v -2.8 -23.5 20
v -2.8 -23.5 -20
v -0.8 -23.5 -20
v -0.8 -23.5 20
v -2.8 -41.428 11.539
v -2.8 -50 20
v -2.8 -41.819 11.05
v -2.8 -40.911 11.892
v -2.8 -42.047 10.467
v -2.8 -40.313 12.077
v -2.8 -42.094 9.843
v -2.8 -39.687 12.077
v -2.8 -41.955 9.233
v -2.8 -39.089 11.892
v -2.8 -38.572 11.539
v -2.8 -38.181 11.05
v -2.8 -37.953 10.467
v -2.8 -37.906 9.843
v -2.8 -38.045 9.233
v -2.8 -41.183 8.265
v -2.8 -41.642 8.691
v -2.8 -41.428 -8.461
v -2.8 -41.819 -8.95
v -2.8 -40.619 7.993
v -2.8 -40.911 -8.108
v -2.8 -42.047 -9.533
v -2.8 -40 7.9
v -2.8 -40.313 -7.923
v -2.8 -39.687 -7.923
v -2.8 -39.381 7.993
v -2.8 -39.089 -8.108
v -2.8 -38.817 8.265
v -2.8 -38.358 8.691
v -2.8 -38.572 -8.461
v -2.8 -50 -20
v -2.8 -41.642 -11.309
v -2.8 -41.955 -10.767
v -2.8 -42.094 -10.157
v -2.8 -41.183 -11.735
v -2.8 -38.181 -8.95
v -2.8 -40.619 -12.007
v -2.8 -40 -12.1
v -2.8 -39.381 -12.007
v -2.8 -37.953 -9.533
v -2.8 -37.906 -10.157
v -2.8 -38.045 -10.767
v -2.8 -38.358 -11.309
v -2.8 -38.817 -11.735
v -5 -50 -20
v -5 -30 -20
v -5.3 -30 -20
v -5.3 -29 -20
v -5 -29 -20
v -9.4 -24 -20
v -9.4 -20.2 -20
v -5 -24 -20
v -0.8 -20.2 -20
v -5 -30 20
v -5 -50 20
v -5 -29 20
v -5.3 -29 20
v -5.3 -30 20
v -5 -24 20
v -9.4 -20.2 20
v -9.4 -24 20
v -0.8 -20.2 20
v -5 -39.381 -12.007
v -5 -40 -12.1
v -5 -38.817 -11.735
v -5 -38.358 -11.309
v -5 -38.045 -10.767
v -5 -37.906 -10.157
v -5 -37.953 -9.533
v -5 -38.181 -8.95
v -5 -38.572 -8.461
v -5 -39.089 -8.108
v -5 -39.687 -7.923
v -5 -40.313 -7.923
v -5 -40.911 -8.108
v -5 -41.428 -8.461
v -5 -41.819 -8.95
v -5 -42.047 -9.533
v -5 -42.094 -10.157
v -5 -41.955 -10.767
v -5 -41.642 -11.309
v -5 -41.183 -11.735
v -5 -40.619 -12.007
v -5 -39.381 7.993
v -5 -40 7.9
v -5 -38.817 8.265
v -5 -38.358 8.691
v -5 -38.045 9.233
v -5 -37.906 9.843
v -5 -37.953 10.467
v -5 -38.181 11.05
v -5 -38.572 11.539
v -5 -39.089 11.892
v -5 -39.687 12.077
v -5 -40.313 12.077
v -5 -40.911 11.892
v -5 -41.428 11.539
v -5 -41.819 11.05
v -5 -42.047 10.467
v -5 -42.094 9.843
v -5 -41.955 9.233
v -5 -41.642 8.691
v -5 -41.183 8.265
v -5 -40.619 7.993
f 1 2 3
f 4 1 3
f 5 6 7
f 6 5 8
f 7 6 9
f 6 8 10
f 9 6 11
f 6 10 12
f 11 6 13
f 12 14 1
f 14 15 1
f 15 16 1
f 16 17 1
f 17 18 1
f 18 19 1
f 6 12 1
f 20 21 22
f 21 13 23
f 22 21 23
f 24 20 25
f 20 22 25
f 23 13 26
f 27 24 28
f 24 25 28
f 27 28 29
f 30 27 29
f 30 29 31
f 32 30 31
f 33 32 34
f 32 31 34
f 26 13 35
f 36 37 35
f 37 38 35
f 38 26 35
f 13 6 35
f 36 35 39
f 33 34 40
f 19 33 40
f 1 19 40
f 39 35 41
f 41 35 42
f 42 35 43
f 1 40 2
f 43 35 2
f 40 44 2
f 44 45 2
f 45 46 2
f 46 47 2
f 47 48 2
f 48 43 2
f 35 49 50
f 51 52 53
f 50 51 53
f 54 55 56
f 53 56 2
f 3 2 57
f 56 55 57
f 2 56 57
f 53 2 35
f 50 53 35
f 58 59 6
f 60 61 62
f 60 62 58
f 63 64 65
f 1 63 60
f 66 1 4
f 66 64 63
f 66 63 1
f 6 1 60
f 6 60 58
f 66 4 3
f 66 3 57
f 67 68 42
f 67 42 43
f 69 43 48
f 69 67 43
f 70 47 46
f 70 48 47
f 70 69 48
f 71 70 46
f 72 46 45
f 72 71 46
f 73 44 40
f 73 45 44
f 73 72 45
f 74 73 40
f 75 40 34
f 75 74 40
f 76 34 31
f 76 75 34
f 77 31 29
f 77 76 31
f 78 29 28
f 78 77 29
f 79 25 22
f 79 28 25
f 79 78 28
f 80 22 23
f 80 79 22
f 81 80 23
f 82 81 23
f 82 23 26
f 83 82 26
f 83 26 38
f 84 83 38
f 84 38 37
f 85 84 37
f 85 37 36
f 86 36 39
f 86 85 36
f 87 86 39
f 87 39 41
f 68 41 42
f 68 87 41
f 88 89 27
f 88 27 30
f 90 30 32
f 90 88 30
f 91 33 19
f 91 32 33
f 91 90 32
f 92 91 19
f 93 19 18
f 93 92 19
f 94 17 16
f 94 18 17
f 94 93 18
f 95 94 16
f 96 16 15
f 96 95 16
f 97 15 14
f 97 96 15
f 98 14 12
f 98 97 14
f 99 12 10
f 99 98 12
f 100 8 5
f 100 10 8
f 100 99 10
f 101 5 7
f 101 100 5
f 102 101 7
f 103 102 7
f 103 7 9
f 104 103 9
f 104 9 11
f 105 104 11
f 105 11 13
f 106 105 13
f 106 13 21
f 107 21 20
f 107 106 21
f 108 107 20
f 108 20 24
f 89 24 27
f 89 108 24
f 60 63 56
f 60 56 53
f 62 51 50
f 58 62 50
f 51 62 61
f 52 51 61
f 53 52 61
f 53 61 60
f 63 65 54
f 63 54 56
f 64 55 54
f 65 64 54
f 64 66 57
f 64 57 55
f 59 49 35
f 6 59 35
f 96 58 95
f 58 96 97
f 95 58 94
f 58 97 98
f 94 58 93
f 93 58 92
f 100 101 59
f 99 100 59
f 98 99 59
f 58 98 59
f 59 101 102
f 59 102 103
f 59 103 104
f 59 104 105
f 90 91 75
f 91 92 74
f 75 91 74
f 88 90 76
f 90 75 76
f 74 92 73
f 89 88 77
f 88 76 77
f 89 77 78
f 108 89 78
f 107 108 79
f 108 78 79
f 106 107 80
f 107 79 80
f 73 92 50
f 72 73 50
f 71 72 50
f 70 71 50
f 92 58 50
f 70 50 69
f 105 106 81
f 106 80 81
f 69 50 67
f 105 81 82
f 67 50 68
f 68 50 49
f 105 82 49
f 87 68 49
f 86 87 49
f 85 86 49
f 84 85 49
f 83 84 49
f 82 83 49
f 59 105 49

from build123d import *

# Parameters (mm, degrees)
CLIP_EXTRUDE_START           = -20
CLIP_EXTRUDE_DEPTH           = 40
ANTIOFFSETBUMP_EXTRUDE_START = -20
ANTIUPLIFTBUMP_SKETCH_W      = 0.3
ANTIUPLIFTBUMP_SKETCH_H      = 1
ANTIOFFSETBUMP_EXTRUDE_DEPTH = 40
MOUNTHOLES_CUT_DEPTH         = 55.665894029
MOUNTHOLES_CUT_DEPTH_BACK    = 55.665894029
MOUNTHOLES_SKETCH_R          = 2.1


with BuildPart() as part:
    # panelClipSection_sketch → clip_extrude (new body)
    with BuildSketch(Plane.XY.offset(CLIP_EXTRUDE_START)):
        Polygon((-9.40000037, -23.99999963), (-5.00000037, -23.99999963), (-5.00000037, -49.99999963), (-2.80000037, -49.99999963), (-2.80000037, -23.49999963), (-0.80000037, -23.49999963), (-0.80000037, -20.19999963), (-9.40000037, -20.19999963), align=None)
    extrude(amount=CLIP_EXTRUDE_DEPTH)

    # antiUpliftBump_sketch → antiOffsetBump_extrude (add)
    with BuildSketch(Plane.XY.offset(ANTIOFFSETBUMP_EXTRUDE_START)):
        with Locations((-5.15000037, -29.49999963)):
            Rectangle(ANTIUPLIFTBUMP_SKETCH_W, ANTIUPLIFTBUMP_SKETCH_H)
    extrude(amount=ANTIOFFSETBUMP_EXTRUDE_DEPTH)

    # mountHoles_sketch → mountHoles_cut (cut, two sides: drawn at the far end of the back side and taken through both)
    with BuildSketch(Plane(origin=(0, 0, 0), x_dir=(0, 0, -1), z_dir=(1, 0, 0)).offset(-MOUNTHOLES_CUT_DEPTH_BACK)):
        with Locations((10, -39.99999963)):
            Circle(MOUNTHOLES_SKETCH_R)
        with Locations((-10, -39.99999963)):
            Circle(MOUNTHOLES_SKETCH_R)
    extrude(amount=MOUNTHOLES_CUT_DEPTH + MOUNTHOLES_CUT_DEPTH_BACK, mode=Mode.SUBTRACT)


solid = part.part
